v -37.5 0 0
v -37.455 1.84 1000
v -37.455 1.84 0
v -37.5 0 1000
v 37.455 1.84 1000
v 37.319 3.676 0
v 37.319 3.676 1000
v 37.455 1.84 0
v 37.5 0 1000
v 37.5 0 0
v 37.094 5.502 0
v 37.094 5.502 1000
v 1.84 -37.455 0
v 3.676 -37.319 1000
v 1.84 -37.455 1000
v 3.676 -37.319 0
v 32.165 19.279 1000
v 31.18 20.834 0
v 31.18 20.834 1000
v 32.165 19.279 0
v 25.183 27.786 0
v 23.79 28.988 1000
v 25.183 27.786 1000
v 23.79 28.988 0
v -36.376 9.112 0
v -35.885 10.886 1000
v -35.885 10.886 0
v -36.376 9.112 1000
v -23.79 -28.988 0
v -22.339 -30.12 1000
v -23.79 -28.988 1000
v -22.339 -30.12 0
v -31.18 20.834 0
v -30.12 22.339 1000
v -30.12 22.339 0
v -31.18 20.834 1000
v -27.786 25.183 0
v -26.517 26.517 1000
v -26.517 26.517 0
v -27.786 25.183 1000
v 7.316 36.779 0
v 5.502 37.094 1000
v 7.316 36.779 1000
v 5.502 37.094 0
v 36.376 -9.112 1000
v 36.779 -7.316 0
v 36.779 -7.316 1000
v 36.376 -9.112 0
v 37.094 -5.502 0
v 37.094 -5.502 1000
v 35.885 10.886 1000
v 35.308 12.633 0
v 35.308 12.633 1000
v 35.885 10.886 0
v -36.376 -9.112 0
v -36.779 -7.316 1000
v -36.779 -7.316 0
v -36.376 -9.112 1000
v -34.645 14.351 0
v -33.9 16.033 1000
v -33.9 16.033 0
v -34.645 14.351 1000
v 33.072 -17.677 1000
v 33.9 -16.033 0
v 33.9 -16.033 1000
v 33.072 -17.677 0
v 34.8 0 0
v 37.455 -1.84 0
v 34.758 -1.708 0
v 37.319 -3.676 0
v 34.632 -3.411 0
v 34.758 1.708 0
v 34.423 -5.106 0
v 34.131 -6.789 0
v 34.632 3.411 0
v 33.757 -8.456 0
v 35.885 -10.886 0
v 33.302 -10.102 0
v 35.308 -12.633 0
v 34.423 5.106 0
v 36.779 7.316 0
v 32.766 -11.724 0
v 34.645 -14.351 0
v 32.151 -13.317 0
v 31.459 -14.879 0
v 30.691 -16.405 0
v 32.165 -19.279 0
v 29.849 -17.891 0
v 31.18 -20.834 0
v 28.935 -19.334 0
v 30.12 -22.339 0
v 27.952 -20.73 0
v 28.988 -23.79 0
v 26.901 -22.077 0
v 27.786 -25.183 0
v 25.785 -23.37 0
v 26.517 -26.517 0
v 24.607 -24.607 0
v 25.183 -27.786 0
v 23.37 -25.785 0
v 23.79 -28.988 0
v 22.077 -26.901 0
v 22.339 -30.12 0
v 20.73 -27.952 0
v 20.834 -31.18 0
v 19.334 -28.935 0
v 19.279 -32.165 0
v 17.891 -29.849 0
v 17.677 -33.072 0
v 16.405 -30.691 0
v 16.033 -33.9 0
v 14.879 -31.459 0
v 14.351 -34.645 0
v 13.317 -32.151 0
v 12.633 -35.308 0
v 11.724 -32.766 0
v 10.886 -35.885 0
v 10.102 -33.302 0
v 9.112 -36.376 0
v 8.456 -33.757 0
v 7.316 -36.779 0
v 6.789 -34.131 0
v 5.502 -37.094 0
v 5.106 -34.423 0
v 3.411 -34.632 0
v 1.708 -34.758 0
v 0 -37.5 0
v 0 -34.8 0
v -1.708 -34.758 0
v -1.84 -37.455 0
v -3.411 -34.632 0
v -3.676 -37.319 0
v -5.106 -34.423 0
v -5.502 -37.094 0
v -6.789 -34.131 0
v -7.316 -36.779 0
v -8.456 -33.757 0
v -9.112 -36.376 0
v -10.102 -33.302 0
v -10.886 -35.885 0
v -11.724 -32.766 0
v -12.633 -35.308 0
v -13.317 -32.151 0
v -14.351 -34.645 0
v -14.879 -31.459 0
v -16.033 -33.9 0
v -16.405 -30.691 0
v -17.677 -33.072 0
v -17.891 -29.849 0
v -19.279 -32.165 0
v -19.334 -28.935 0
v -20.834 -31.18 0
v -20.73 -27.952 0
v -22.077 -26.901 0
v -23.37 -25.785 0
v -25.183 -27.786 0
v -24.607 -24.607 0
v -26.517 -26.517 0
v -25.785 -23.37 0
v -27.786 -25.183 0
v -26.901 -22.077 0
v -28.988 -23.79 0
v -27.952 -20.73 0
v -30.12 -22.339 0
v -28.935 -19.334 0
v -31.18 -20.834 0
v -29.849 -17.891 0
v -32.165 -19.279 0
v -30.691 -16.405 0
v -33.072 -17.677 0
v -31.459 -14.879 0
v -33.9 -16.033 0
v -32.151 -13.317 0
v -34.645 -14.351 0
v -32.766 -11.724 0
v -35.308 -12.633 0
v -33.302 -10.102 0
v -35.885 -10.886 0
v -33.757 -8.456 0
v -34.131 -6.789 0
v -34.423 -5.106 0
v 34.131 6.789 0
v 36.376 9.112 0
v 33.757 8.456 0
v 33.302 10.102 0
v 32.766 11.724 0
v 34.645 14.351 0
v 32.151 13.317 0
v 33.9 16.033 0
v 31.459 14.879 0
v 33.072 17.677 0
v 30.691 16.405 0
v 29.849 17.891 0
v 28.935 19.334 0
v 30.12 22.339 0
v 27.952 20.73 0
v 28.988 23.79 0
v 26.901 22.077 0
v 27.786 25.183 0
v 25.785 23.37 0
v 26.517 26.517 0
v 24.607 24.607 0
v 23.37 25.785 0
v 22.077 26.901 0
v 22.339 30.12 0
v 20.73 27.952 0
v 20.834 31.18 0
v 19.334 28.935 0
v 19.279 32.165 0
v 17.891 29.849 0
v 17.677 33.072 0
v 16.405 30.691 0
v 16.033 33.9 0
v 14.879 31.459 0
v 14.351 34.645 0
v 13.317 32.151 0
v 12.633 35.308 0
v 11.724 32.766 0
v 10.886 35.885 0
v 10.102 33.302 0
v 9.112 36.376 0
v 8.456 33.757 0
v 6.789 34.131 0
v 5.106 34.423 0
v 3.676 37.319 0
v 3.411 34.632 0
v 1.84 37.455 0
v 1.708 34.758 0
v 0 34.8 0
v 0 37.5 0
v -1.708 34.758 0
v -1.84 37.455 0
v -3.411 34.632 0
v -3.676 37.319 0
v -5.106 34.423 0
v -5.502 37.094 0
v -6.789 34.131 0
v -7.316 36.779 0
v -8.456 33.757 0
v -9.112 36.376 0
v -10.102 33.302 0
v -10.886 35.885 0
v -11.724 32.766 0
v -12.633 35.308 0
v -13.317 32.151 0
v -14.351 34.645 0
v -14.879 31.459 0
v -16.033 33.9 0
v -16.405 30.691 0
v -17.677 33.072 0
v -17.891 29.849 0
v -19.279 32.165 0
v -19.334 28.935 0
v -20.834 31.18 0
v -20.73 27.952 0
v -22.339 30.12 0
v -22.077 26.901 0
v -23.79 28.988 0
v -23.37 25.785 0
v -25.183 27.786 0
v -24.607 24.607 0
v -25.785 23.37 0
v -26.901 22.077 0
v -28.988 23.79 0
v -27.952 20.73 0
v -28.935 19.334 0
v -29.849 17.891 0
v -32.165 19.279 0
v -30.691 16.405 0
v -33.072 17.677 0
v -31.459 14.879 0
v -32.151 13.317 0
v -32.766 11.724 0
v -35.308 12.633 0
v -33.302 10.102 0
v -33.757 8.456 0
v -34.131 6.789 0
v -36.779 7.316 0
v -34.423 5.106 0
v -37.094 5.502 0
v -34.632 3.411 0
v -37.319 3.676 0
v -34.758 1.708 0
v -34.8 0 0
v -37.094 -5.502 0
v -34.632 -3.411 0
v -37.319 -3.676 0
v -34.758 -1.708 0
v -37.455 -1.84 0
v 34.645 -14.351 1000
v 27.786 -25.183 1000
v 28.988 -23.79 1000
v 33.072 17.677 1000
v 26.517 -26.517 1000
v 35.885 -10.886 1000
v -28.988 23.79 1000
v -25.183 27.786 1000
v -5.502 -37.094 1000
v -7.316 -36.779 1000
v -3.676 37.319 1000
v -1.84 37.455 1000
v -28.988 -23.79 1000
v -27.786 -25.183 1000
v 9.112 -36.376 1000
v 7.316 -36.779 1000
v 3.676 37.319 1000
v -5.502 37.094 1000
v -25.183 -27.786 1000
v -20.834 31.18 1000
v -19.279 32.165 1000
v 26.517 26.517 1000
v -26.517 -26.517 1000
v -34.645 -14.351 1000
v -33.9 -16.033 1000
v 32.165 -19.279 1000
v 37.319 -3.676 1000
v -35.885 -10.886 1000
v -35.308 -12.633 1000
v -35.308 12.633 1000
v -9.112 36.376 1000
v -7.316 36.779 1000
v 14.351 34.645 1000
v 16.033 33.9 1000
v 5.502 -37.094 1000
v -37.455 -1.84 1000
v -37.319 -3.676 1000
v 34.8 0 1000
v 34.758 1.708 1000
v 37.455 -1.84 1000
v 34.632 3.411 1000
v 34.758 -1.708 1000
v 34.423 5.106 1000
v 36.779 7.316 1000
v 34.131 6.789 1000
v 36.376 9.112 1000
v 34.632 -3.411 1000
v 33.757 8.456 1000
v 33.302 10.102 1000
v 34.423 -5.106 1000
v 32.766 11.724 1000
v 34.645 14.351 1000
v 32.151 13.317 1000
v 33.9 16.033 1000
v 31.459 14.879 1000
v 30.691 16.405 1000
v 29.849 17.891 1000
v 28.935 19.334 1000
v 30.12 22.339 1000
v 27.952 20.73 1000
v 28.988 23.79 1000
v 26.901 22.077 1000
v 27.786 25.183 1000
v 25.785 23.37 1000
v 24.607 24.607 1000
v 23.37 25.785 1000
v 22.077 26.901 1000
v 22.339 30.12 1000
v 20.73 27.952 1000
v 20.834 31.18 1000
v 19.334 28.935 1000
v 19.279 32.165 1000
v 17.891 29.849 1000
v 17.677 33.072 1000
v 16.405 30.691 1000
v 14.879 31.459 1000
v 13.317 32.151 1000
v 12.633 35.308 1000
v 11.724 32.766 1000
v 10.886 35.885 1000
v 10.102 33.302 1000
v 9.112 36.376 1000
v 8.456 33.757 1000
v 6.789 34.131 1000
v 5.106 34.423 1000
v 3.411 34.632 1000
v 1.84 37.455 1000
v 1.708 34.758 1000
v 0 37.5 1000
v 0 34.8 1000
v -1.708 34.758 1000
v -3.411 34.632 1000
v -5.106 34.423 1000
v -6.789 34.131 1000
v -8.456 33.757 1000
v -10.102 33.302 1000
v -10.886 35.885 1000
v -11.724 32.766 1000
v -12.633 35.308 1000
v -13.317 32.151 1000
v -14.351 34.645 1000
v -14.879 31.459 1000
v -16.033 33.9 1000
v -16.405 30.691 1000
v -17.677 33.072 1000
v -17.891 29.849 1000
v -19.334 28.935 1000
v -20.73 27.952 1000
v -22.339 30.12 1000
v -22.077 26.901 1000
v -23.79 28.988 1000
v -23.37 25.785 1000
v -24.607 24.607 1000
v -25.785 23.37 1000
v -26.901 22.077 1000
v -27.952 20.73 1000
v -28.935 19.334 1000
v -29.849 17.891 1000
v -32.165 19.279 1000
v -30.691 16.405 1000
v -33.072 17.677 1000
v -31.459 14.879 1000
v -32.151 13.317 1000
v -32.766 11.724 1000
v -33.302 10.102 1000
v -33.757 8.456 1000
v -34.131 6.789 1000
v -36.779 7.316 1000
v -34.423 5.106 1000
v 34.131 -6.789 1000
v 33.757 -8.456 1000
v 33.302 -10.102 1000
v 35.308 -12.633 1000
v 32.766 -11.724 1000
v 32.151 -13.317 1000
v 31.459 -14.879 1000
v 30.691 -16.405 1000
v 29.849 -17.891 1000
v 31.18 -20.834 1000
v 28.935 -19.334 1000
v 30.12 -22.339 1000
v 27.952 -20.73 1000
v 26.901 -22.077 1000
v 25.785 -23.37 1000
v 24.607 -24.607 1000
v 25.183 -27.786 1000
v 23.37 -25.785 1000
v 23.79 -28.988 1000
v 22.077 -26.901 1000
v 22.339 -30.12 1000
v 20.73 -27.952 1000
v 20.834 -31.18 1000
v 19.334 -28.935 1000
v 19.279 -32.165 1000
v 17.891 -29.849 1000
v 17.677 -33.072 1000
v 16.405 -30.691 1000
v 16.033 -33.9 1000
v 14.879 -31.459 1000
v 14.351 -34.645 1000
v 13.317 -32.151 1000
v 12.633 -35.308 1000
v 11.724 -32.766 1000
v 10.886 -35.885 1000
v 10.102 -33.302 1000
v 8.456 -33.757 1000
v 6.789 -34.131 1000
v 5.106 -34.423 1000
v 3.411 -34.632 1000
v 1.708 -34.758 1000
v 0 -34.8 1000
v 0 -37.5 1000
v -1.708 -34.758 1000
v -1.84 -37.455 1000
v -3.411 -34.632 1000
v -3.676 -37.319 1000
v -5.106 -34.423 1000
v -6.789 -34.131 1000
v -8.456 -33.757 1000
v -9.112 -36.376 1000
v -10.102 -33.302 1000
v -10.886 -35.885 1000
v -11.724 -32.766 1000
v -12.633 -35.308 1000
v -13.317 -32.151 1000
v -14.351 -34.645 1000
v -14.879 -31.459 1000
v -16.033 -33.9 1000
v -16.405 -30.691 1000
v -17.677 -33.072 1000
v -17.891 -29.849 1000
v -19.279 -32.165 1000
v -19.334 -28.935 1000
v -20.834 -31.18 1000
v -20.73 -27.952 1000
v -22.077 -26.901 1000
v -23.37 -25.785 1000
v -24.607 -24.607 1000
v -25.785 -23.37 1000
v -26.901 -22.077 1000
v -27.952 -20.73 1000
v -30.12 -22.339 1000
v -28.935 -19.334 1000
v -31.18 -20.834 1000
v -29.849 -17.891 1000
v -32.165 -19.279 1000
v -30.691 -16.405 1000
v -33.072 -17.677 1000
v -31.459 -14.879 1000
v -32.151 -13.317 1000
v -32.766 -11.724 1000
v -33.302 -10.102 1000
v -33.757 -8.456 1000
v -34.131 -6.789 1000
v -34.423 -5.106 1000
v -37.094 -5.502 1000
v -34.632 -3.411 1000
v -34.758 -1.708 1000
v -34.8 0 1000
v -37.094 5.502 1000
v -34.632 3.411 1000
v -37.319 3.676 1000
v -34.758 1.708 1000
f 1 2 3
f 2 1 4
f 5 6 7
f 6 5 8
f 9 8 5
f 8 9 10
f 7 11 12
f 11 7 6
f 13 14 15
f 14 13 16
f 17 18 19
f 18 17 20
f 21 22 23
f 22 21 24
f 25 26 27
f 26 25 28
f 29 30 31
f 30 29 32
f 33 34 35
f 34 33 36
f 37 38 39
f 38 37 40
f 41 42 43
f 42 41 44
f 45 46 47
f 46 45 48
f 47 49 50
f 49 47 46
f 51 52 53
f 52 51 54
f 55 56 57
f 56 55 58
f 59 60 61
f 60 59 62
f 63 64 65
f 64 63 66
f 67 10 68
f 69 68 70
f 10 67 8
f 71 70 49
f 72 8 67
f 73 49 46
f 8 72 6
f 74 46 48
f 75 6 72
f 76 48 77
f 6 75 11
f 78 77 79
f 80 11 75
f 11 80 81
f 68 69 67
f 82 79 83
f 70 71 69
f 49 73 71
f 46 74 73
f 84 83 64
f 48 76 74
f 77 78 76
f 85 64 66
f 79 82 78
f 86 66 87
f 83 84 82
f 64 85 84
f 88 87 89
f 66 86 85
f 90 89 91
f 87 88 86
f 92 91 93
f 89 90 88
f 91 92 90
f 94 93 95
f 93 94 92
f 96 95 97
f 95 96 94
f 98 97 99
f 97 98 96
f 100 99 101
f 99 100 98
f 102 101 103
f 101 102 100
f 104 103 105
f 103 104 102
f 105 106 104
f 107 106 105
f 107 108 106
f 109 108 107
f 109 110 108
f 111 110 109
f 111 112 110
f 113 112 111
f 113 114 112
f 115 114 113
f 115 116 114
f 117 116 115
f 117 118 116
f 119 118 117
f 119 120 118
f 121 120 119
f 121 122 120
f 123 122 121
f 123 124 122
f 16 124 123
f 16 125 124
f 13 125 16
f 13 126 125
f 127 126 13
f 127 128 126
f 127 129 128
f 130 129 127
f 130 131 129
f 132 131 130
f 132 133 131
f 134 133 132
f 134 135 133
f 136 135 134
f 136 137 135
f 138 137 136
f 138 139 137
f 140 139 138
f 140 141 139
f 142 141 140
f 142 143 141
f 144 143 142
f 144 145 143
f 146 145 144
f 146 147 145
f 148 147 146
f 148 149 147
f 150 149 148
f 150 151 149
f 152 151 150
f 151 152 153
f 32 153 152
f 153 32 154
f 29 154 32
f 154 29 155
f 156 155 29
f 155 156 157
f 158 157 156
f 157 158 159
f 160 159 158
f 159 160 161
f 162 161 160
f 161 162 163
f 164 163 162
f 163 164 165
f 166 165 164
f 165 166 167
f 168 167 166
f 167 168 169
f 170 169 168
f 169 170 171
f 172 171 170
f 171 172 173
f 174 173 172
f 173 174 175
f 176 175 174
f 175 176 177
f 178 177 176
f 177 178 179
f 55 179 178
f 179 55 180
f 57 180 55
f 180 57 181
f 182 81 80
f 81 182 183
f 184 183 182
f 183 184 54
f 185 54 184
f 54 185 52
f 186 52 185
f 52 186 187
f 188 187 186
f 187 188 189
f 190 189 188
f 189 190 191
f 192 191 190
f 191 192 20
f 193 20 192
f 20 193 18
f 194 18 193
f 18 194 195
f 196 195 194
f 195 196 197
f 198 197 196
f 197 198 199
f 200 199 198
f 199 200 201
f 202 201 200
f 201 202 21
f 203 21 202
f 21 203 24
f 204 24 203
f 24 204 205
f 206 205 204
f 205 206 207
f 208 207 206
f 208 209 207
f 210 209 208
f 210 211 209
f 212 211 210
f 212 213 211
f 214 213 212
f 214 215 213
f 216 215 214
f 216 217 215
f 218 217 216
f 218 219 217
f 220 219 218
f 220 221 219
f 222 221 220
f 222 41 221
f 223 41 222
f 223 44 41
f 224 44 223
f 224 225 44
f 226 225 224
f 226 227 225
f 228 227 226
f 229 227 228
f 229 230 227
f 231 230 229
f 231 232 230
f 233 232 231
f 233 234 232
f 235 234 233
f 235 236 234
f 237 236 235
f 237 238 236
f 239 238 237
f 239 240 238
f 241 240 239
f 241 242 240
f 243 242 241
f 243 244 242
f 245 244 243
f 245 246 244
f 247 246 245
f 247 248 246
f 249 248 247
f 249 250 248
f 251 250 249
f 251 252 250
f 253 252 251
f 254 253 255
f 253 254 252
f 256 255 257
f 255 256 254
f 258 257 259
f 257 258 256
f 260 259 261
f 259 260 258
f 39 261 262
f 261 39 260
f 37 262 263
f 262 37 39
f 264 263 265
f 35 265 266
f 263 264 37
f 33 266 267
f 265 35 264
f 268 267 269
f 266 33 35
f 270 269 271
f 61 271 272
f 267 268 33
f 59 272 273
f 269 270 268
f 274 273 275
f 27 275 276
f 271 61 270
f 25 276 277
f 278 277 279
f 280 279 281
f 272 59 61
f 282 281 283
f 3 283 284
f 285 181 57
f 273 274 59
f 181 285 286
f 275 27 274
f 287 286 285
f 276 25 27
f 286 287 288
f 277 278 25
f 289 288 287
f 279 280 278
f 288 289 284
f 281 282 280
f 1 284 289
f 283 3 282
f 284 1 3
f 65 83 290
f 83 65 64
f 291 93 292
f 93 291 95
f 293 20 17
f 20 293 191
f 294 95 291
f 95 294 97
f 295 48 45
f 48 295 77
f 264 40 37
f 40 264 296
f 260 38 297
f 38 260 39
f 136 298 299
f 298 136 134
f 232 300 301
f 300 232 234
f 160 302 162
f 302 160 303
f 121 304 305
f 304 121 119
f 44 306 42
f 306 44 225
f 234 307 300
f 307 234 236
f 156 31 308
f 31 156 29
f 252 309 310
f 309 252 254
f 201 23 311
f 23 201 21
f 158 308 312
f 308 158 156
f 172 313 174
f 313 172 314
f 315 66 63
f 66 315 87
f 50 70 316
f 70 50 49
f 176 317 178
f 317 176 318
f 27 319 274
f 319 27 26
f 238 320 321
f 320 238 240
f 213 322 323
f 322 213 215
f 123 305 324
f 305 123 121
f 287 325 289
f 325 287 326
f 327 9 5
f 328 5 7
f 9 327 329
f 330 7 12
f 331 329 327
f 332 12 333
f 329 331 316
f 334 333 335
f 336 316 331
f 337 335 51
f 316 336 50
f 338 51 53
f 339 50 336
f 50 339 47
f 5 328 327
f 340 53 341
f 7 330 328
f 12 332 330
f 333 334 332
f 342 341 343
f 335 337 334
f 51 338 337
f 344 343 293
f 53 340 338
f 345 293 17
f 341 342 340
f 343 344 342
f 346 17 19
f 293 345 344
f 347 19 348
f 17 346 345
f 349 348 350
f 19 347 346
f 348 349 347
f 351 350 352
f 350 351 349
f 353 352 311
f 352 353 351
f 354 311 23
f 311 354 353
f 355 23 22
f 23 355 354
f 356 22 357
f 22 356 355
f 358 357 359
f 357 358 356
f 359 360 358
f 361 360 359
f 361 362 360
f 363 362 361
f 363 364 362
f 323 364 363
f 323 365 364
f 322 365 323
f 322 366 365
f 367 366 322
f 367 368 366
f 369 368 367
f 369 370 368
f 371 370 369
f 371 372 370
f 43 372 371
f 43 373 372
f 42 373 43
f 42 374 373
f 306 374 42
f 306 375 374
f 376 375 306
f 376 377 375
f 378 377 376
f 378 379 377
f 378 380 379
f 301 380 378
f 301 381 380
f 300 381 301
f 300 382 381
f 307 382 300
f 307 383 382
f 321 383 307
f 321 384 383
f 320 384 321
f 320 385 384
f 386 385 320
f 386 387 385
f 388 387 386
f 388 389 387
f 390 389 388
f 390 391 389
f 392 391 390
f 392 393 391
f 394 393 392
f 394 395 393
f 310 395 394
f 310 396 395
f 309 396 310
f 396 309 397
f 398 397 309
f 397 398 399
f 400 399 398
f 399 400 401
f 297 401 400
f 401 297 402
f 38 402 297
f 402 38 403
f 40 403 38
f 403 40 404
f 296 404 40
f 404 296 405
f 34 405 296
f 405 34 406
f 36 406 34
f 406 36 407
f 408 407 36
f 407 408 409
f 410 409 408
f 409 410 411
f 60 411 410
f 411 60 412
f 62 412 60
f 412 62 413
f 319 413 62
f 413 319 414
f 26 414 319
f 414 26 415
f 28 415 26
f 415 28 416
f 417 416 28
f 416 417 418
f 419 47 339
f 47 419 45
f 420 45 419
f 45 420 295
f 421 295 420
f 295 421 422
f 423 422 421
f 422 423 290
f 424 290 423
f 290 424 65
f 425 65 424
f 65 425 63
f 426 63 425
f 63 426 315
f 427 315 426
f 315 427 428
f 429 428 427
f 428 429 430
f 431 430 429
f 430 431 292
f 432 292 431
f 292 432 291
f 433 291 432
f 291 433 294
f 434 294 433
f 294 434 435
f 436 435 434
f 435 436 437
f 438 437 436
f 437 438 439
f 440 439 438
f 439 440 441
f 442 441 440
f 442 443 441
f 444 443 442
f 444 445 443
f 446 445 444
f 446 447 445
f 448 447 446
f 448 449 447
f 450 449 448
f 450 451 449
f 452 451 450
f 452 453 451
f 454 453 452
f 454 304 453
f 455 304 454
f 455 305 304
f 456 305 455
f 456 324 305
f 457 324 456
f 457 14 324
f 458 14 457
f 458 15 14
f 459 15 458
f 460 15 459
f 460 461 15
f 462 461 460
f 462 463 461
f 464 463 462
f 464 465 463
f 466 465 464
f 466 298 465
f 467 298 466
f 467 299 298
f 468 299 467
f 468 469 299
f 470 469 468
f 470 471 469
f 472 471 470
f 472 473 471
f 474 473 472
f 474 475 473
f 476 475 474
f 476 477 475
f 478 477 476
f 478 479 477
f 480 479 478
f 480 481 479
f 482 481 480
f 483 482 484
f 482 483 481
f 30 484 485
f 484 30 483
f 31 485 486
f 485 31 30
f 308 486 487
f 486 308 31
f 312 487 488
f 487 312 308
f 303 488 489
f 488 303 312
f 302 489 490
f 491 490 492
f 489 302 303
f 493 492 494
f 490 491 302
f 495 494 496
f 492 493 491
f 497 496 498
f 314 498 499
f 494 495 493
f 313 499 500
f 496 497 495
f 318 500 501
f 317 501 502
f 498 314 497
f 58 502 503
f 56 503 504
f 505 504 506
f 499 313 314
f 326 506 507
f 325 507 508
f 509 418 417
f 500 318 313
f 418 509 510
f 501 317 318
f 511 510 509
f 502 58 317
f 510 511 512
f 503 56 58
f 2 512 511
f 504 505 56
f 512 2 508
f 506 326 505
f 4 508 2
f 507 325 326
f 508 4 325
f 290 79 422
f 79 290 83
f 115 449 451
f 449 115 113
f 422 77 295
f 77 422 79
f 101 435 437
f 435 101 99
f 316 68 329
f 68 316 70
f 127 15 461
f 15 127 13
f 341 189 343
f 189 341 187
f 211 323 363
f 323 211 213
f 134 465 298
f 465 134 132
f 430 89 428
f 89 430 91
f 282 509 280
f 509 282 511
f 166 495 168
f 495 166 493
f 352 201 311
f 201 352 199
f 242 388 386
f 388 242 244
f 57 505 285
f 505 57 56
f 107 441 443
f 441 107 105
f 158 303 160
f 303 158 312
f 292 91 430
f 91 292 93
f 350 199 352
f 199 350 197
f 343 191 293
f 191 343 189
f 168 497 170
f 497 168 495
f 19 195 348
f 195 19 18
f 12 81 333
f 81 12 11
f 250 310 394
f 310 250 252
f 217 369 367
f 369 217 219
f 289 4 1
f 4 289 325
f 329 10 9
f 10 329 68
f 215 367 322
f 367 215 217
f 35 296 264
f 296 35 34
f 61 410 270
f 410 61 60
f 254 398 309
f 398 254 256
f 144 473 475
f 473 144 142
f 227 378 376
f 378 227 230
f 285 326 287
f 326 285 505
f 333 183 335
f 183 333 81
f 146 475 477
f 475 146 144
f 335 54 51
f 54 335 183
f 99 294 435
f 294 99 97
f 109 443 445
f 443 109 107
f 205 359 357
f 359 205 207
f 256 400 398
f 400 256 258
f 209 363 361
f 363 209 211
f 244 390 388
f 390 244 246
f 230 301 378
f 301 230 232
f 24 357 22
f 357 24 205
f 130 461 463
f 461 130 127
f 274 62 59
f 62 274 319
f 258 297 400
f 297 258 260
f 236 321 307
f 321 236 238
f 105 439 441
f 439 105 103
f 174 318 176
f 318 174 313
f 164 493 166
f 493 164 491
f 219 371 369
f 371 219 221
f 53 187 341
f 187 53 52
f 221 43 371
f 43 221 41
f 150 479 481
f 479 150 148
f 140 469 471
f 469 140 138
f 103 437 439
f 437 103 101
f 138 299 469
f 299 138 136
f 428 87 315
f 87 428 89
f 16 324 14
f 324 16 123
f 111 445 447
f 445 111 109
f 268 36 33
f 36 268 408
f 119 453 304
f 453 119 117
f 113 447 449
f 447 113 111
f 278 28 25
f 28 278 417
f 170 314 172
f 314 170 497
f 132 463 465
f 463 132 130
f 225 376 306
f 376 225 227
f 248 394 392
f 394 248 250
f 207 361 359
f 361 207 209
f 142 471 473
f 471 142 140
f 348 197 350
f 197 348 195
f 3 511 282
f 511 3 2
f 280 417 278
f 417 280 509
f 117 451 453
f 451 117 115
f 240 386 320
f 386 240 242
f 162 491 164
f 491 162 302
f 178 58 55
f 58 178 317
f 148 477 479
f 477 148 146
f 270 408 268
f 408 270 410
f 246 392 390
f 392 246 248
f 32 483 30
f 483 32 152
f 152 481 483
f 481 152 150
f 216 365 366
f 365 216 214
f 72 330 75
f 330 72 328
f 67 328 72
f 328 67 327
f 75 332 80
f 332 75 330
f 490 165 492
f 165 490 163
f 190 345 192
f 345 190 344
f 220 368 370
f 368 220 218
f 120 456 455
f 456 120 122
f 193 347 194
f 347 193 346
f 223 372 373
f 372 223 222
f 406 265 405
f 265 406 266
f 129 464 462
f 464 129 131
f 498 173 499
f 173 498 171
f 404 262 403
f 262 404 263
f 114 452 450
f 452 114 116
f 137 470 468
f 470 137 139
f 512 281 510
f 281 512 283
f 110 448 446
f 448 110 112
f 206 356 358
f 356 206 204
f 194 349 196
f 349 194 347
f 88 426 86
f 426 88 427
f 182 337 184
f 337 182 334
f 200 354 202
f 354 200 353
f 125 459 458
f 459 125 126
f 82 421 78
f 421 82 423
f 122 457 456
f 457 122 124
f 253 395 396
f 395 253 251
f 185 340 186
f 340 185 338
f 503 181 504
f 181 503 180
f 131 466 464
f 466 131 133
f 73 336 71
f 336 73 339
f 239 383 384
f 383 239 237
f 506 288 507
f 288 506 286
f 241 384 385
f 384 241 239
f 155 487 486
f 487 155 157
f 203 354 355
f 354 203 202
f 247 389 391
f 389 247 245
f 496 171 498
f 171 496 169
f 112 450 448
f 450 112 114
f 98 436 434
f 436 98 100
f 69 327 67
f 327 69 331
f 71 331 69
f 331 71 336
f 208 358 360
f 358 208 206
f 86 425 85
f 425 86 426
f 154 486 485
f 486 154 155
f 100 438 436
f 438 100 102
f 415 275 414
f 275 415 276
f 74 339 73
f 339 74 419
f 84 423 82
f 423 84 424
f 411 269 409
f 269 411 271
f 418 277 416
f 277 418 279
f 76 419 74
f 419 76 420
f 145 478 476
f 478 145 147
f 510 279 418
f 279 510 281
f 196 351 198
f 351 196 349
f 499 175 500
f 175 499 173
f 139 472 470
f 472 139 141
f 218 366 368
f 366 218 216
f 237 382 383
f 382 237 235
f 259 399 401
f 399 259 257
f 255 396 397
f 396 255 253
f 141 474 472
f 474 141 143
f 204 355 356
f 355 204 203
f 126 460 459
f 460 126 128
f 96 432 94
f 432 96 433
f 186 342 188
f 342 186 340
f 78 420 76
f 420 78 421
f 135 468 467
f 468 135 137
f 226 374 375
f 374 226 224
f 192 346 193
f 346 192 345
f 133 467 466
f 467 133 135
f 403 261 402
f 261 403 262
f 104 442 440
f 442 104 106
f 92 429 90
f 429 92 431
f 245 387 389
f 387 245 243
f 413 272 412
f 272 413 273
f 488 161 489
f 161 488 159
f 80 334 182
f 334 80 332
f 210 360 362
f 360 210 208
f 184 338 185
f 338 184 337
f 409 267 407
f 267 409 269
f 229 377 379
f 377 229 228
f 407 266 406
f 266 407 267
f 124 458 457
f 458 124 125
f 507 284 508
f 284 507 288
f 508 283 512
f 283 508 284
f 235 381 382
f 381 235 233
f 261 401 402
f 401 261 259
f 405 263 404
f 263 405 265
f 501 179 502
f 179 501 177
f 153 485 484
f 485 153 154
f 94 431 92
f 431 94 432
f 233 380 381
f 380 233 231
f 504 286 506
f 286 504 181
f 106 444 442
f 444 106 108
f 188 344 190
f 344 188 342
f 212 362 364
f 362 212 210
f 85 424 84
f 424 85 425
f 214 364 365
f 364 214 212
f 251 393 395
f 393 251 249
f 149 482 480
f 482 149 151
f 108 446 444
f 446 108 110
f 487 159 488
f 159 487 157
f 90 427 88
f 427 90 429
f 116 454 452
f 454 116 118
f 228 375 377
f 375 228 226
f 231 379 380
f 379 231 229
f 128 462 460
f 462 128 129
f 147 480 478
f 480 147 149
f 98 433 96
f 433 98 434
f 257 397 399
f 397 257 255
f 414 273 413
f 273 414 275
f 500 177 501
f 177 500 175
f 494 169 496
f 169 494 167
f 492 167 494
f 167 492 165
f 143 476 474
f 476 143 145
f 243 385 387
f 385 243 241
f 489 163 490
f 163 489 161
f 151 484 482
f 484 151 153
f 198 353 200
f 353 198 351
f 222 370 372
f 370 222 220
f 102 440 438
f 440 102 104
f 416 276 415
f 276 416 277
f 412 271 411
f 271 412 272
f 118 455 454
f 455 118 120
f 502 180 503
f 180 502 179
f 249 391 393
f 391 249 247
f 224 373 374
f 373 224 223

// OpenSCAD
$fn = 128;

// HT pipe parameters (approximate for HT 75)
pipe_length = 1000;          // mm
outer_diameter = 75;         // mm (nominal)
wall_thickness = 2.7;        // mm (typical HT pipe wall)
inner_diameter = outer_diameter - 2*wall_thickness;

module ht_pipe(od, id, len) {
    difference() {
        cylinder(h = len, d = od, center = false);
        translate([0,0,-0.1])
            cylinder(h = len + 0.2, d = id, center = false);
    }
}

ht_pipe(outer_diameter, inner_diameter, pipe_length);
